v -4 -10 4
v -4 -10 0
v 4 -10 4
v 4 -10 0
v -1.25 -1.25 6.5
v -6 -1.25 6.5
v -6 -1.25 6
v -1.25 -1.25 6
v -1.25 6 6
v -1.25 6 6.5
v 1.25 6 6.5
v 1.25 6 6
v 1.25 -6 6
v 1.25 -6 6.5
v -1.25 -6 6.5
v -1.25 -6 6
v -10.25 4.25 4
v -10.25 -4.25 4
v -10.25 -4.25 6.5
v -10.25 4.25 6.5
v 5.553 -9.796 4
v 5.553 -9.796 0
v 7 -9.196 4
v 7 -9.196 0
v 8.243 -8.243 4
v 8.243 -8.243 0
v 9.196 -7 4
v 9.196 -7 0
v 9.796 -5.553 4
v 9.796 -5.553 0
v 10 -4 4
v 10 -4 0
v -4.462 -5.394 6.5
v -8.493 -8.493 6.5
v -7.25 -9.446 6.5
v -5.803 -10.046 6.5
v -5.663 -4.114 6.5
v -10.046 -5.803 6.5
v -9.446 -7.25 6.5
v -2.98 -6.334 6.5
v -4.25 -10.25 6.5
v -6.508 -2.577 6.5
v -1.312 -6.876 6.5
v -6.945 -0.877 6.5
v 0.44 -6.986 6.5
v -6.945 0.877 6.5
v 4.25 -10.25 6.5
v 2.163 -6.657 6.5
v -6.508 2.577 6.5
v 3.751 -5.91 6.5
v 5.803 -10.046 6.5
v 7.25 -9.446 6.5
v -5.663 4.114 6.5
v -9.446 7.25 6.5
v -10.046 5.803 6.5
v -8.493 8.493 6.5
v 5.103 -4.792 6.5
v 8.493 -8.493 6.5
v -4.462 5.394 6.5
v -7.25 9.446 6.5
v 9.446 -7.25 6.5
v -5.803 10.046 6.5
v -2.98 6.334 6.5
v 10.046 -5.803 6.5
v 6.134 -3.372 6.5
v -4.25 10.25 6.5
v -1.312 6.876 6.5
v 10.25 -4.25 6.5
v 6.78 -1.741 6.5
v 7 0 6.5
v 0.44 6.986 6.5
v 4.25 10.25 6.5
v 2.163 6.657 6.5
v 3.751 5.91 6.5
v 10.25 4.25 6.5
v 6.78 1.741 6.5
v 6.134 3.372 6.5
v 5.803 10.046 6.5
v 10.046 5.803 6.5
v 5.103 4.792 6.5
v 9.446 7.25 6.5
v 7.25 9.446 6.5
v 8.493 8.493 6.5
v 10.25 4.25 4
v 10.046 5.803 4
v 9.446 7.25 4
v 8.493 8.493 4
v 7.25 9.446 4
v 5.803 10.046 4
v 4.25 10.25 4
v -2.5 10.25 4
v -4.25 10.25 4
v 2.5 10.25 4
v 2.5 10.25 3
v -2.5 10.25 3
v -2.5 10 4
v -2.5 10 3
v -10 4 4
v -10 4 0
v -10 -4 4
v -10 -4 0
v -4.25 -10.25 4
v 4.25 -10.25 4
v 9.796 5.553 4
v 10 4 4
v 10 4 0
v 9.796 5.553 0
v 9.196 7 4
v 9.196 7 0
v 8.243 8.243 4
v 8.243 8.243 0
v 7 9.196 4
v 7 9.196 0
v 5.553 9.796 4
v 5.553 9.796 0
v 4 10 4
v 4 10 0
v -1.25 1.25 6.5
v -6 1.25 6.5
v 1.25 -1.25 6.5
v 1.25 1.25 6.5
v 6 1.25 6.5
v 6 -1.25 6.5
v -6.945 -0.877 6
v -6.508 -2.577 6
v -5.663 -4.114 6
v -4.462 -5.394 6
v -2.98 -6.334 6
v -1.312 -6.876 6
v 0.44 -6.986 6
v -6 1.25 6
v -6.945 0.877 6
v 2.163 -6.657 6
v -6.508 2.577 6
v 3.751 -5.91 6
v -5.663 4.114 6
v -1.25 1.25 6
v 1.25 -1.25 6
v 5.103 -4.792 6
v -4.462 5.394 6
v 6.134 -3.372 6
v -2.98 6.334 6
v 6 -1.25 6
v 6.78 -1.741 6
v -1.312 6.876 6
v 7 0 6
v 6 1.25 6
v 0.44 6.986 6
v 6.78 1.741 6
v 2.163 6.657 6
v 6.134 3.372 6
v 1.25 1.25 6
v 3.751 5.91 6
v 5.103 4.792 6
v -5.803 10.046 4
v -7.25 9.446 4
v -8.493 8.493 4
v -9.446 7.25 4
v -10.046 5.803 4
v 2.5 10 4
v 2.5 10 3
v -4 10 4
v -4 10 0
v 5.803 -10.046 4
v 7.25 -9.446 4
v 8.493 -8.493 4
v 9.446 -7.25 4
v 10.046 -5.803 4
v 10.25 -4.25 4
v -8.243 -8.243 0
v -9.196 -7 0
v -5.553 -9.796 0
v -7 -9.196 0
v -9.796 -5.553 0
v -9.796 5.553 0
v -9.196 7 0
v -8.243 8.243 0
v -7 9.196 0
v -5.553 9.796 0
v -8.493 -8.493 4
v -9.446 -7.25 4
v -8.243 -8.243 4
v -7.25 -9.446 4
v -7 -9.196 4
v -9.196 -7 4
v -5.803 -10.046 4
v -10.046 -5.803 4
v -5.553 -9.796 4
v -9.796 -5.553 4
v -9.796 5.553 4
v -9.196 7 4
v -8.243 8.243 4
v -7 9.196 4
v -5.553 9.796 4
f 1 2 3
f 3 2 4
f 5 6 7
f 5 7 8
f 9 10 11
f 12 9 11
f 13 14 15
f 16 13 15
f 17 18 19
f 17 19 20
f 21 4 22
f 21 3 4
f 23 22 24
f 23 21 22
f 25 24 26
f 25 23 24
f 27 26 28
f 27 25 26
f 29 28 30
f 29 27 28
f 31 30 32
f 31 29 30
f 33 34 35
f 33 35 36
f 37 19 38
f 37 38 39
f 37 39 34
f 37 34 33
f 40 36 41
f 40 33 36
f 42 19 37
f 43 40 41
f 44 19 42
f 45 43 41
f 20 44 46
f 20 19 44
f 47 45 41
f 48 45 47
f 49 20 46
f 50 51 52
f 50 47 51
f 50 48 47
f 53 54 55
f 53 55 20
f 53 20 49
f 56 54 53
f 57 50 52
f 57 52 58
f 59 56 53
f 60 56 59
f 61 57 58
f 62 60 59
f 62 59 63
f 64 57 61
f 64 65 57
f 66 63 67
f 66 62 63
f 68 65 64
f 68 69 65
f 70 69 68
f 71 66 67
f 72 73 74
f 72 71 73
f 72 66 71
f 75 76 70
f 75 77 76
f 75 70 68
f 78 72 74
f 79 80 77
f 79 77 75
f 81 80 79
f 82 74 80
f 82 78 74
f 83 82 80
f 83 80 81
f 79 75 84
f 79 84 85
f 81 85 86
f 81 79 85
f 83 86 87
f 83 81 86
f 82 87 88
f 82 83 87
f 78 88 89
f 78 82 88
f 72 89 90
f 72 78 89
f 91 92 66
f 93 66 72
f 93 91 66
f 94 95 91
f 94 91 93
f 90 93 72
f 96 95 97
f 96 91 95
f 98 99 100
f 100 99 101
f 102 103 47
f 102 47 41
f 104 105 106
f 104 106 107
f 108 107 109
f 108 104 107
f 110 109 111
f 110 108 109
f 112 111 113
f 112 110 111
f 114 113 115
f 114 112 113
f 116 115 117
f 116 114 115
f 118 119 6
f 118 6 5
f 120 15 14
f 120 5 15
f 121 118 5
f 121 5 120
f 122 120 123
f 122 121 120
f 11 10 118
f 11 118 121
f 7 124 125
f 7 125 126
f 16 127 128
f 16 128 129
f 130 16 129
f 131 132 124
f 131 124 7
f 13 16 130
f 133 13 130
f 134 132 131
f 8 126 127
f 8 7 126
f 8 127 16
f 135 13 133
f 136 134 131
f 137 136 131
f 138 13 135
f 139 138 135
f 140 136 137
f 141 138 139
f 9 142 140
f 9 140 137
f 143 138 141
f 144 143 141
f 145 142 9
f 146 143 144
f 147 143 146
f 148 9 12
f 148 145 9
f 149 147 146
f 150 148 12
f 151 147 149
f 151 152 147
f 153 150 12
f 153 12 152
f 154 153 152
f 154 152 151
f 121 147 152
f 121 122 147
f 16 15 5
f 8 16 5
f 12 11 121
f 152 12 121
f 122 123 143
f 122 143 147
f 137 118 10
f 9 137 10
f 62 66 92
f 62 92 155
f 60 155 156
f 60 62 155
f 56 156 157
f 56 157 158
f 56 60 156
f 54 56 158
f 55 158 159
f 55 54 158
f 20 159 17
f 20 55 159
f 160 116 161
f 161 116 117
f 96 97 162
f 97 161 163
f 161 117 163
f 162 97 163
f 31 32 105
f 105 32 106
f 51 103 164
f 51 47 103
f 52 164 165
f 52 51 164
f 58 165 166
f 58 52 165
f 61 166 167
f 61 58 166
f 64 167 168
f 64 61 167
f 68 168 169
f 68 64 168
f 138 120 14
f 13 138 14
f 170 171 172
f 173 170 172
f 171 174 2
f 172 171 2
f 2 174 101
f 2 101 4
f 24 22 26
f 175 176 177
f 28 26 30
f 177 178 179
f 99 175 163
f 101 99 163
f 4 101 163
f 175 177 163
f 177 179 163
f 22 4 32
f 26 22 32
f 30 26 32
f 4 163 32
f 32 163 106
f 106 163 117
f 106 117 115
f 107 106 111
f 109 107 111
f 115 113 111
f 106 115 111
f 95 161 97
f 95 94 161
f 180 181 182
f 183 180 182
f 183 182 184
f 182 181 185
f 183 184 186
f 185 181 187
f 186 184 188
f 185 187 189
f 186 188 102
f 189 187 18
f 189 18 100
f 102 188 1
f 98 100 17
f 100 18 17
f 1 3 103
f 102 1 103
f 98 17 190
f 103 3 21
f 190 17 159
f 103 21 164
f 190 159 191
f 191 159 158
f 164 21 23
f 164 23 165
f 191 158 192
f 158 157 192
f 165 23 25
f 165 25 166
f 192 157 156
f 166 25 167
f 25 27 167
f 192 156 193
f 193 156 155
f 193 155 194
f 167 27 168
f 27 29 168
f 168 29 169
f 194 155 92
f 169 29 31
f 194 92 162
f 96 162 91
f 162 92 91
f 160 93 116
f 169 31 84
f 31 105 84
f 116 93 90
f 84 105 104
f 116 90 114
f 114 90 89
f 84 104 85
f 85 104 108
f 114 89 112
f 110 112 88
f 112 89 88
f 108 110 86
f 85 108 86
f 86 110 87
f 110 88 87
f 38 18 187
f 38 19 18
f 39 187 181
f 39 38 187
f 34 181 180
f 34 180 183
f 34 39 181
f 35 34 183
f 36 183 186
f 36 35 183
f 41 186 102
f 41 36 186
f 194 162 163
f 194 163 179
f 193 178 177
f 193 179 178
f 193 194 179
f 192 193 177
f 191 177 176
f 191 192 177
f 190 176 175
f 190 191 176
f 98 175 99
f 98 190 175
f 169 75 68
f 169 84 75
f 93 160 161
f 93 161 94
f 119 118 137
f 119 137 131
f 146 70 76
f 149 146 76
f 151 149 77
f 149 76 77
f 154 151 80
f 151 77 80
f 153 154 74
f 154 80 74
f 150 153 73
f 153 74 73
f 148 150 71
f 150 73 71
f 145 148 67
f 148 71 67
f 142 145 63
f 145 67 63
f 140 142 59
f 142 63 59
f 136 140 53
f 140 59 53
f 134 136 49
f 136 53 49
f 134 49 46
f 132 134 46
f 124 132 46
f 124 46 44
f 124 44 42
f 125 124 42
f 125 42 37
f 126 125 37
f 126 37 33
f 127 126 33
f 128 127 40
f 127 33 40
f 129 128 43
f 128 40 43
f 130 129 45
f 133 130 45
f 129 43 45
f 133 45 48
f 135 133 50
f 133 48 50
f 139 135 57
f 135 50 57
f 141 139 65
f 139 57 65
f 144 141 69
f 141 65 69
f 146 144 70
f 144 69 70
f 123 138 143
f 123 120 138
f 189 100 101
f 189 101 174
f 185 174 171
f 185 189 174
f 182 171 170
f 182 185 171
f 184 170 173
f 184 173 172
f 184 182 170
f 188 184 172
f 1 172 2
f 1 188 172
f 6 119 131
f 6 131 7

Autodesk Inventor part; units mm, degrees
ref_plane "YZ Plane" through (0, 0, 0) normal (1, 0, 0) x (0, 1, 0)
ref_plane "XZ Plane" through (0, 0, 0) normal (0, 1, 0) x (-1, 0, 0)
ref_plane "XY Plane" through (0, 0, 0) normal (0, 0, 1) x (1, 0, 0)
sketch "Sketch1" plane through (0, 0, 0) normal (0, 0, 1) x (1, 0, 0)
  line L0 (-10, -10) -> (10, -10)
  line L1 (10, -10) -> (10, 10)
  line L2 (10, 10) -> (-10, 10)
  line L3 (-10, 10) -> (-10, -10)
  line L4 (-10, -10) -> (10, 10) construction
  line L5 (10, -10) -> (-10, 10) construction
  point P0 (0, 0)
  dimension "d0" = 20
  dimension "d1" = 20
extrude "Extrusion1" add sketch "Sketch1" along normal blind 4
sketch "Sketch2" plane through (0, 0, 4) normal (0, 0, 1) x (1, 0, 0)
  line L0 (-10.25, 10.25) -> (10.25, 10.25)
  line L1 (10.25, 10.25) -> (10.25, -10.25)
  line L2 (10.25, -10.25) -> (-10.25, -10.25)
  line L3 (-10.25, -10.25) -> (-10.25, 10.25)
  line L4 (-10.25, 10.25) -> (10.25, -10.25) construction
  line L5 (10.25, 10.25) -> (-10.25, -10.25) construction
  point P0 (0, 0)
  dimension "d4" = 20.5
  dimension "d5" = 20.5
extrude "Extrusion2" add sketch "Sketch2" along normal blind 2.5
fillet "Fillet1" radius 6 8 edges at (-10, 10, 2) (10, 10, 2) (-10, -10, 2) (-10.25, -10.25, 5.25) (-10.25, 10.25, 5.25) (10.25, 10.25, 5.25) (10, -10, 2) (10.25, -10.25, 5.25)
sketch "Sketch3" plane through (0, 0, 4) normal (0, 0, -1) x (-1, 0, 0)
  line L0 (-4.25, 10.25) -> (4.25, 10.25) projected
  line L1 (2.5, 9.75) -> (-2.5, 9.75)
  line L2 (-2.5, 9.75) -> (-2.5, 10.25)
  line L3 (-2.5, 10.25) -> (2.5, 10.25)
  line L4 (2.5, 10.25) -> (2.5, 9.75)
  line L5 (-4, 10) -> (4, 10) projected
  line L6 (2.5, 9.75) -> (-2.5, 10.25) construction
  line L7 (-2.5, 9.75) -> (2.5, 10.25) construction
  point P0 (0, 0)
  point P1 (0, 10)
  dimension "d9" = 5
extrude "Extrusion3" add sketch "Sketch3" along normal blind 1
sketch "Sketch4" plane through (0, 0, 6.5) normal (0, 0, 1) x (1, 0, 0)
  circle A0 centre (0, 0) radius 7
  line L0 (-6, -1.25) -> (6, -1.25)
  line L1 (6, -1.25) -> (6, 1.25)
  line L2 (6, 1.25) -> (-6, 1.25)
  line L3 (-6, 1.25) -> (-6, -1.25)
  line L4 (-6, -1.25) -> (6, 1.25) construction
  line L5 (6, -1.25) -> (-6, 1.25) construction
  line L6 (1.25, -6) -> (-1.25, -6)
  line L7 (-1.25, -6) -> (-1.25, 6)
  line L8 (-1.25, 6) -> (1.25, 6)
  line L9 (1.25, 6) -> (1.25, -6)
  line L10 (1.25, -6) -> (-1.25, 6) construction
  line L11 (-1.25, -6) -> (1.25, 6) construction
  point P0 (-1.25, 1.25)
  point P1 (1.25, 1.25)
  point P2 (1.25, -1.25)
  point P3 (-1.25, -1.25)
  dimension "d12" = 14
  dimension "d13" = 12
  dimension "d14" = 2.5
  dimension "d15" = 2.5
  dimension "d16" = 12
extrude "Extrusion4" cut sketch "Sketch4" against normal blind 0.5
equation "\"d1\" = d0"
equation "\"d5\" = d4"
properties part number "Health-Item-Pack"
